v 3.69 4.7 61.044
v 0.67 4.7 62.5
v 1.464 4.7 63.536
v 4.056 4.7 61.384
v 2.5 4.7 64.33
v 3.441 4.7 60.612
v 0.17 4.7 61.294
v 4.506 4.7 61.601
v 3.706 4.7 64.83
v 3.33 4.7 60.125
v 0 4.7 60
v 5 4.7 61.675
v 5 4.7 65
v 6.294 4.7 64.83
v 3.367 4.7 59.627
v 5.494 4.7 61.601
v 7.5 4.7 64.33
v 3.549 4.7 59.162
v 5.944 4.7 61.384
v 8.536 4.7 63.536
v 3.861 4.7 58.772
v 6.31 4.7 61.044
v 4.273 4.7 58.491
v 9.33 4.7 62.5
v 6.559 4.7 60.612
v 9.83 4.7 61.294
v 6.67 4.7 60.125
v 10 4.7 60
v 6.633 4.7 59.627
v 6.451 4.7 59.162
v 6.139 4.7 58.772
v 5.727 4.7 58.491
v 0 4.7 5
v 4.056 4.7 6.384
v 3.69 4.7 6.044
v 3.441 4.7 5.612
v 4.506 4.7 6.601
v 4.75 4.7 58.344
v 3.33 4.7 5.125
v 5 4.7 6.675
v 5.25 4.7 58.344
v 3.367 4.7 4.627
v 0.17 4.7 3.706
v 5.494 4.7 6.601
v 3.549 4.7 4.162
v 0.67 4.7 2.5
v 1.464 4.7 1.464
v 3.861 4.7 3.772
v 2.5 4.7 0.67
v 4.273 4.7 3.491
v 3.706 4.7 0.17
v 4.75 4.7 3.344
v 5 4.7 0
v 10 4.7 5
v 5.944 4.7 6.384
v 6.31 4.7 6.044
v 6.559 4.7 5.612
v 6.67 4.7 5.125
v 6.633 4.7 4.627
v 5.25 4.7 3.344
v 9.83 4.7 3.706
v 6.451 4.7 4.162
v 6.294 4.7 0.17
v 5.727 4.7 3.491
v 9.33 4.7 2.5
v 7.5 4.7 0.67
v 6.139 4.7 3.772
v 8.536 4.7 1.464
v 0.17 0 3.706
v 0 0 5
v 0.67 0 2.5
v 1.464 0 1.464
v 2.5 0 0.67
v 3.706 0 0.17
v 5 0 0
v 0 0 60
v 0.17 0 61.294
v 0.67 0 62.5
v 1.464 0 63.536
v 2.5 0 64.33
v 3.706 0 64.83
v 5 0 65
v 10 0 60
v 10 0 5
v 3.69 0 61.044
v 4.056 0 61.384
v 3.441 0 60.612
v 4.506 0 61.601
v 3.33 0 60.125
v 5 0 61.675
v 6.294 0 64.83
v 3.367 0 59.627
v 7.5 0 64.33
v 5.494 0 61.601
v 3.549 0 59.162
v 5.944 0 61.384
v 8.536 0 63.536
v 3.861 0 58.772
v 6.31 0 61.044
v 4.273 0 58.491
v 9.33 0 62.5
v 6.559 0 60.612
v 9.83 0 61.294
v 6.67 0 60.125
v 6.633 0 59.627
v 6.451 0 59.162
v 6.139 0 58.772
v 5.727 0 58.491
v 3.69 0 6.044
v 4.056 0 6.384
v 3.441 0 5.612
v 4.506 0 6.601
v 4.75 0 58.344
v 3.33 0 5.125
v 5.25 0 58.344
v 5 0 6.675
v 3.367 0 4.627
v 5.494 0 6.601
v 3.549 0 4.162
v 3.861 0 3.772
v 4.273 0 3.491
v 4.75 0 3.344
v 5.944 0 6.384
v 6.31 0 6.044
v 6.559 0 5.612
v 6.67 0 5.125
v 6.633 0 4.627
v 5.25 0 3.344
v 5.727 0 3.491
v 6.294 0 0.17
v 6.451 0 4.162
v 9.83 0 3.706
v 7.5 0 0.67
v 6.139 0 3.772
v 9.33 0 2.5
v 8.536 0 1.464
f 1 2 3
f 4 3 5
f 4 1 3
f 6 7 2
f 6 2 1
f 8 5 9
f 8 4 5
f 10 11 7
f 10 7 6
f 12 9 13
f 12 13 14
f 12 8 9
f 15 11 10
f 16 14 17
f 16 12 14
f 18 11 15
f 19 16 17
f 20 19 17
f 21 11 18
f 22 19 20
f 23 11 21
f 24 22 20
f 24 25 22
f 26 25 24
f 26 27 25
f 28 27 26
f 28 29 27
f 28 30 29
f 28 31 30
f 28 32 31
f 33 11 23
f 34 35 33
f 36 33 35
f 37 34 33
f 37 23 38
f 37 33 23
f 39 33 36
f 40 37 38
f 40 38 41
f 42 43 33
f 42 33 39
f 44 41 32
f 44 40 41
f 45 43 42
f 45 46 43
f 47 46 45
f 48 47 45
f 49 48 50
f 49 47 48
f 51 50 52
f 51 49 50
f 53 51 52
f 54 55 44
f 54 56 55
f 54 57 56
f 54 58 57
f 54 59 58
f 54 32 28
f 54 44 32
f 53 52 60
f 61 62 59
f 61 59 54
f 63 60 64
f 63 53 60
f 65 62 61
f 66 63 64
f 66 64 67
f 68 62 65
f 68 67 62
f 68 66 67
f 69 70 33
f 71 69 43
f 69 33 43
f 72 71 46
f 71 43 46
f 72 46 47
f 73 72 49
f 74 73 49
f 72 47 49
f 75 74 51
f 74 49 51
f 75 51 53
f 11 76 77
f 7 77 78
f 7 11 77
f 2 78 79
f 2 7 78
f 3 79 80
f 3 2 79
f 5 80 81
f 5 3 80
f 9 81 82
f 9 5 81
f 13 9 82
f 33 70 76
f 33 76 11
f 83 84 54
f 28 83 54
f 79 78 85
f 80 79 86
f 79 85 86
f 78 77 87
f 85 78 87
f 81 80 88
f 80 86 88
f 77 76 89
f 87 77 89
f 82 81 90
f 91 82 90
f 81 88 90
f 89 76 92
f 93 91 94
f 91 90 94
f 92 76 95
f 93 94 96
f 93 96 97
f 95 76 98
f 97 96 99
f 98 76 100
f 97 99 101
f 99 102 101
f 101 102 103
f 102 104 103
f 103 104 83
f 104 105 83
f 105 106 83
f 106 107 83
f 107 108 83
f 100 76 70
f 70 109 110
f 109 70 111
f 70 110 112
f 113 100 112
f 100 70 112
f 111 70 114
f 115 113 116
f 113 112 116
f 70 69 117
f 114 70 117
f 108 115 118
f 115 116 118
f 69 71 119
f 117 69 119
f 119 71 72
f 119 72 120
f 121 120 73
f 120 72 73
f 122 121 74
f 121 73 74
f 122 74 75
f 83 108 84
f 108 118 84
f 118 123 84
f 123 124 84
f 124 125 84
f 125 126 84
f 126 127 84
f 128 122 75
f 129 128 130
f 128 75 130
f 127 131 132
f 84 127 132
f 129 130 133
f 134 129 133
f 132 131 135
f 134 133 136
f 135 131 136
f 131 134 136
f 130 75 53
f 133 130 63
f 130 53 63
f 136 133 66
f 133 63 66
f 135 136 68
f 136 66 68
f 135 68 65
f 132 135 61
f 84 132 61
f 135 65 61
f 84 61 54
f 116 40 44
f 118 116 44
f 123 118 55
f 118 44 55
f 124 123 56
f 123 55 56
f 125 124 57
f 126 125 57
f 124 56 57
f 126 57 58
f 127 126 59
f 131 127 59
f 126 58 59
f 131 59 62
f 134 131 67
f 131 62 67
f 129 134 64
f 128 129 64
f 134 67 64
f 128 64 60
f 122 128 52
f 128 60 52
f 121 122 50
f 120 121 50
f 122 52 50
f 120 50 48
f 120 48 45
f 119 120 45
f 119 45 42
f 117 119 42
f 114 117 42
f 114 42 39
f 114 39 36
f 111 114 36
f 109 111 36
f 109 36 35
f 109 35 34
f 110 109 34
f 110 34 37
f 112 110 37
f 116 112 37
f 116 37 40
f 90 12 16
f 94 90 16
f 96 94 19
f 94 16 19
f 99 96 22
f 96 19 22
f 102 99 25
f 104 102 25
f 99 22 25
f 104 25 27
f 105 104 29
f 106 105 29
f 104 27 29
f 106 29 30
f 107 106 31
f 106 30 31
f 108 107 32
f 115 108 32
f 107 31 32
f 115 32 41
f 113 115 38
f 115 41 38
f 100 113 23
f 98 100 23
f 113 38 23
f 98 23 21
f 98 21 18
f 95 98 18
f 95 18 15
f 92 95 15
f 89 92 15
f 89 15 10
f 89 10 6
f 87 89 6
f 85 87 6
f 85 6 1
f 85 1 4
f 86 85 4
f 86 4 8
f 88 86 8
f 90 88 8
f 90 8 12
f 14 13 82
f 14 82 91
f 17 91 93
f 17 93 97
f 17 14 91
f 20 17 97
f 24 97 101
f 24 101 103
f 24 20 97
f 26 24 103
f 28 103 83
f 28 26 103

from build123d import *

# Parameters (mm, degrees)
SKETCH_1_W          = 10
SKETCH_1_H          = 5
EXTRUDE_1_DEPTH     = 65
SKETCH_2_R          = 1.675
CUT_EXTRUDE_1_DEPTH = 40
FILLET_1_R          = 5
SKETCH_3_W          = 36.824134977
SKETCH_3_H          = 78.201072097
CUT_EXTRUDE_2_DEPTH = 0.3


with BuildPart() as part:
    # 草图1 → 凸台-拉伸1 (new body)
    with BuildSketch(Plane.XY):
        with Locations((5, 2.5)):
            Rectangle(SKETCH_1_W, SKETCH_1_H)
    extrude(amount=EXTRUDE_1_DEPTH)

    # 草图2 → 切除-拉伸1 (cut)
    with BuildSketch(Plane(origin=(0, 5, 0), x_dir=(1, 0, 0), z_dir=(0, 1, 0))):
        with Locations(Location((5, -5, 0), (0, 0, 270))):
            Circle(SKETCH_2_R)
        with Locations(Location((5, -60, 0), (0, 0, 270))):
            Circle(SKETCH_2_R)
    extrude(amount=-CUT_EXTRUDE_1_DEPTH, mode=Mode.SUBTRACT)

    # 圆角1
    fillet_1_edges = [part.edges().sort_by_distance(p)[0] for p in [
        (0, 2.5, 65),
        (10, 2.5, 65),
        (0, 2.5, 0),
        (10, 2.5, 0),
    ]]
    fillet(fillet_1_edges, radius=FILLET_1_R - 0.0001)  # a hair under: the kernel refuses the full size

    # 草图3 → 切除-拉伸2 (cut)
    with BuildSketch(Plane(origin=(0, 5, 0), x_dir=(1, 0, 0), z_dir=(0, 1, 0))):
        with Locations((11.293579433, -34.071434458)):
            Rectangle(SKETCH_3_W, SKETCH_3_H)
    extrude(amount=-CUT_EXTRUDE_2_DEPTH, mode=Mode.SUBTRACT)


solid = part.part
